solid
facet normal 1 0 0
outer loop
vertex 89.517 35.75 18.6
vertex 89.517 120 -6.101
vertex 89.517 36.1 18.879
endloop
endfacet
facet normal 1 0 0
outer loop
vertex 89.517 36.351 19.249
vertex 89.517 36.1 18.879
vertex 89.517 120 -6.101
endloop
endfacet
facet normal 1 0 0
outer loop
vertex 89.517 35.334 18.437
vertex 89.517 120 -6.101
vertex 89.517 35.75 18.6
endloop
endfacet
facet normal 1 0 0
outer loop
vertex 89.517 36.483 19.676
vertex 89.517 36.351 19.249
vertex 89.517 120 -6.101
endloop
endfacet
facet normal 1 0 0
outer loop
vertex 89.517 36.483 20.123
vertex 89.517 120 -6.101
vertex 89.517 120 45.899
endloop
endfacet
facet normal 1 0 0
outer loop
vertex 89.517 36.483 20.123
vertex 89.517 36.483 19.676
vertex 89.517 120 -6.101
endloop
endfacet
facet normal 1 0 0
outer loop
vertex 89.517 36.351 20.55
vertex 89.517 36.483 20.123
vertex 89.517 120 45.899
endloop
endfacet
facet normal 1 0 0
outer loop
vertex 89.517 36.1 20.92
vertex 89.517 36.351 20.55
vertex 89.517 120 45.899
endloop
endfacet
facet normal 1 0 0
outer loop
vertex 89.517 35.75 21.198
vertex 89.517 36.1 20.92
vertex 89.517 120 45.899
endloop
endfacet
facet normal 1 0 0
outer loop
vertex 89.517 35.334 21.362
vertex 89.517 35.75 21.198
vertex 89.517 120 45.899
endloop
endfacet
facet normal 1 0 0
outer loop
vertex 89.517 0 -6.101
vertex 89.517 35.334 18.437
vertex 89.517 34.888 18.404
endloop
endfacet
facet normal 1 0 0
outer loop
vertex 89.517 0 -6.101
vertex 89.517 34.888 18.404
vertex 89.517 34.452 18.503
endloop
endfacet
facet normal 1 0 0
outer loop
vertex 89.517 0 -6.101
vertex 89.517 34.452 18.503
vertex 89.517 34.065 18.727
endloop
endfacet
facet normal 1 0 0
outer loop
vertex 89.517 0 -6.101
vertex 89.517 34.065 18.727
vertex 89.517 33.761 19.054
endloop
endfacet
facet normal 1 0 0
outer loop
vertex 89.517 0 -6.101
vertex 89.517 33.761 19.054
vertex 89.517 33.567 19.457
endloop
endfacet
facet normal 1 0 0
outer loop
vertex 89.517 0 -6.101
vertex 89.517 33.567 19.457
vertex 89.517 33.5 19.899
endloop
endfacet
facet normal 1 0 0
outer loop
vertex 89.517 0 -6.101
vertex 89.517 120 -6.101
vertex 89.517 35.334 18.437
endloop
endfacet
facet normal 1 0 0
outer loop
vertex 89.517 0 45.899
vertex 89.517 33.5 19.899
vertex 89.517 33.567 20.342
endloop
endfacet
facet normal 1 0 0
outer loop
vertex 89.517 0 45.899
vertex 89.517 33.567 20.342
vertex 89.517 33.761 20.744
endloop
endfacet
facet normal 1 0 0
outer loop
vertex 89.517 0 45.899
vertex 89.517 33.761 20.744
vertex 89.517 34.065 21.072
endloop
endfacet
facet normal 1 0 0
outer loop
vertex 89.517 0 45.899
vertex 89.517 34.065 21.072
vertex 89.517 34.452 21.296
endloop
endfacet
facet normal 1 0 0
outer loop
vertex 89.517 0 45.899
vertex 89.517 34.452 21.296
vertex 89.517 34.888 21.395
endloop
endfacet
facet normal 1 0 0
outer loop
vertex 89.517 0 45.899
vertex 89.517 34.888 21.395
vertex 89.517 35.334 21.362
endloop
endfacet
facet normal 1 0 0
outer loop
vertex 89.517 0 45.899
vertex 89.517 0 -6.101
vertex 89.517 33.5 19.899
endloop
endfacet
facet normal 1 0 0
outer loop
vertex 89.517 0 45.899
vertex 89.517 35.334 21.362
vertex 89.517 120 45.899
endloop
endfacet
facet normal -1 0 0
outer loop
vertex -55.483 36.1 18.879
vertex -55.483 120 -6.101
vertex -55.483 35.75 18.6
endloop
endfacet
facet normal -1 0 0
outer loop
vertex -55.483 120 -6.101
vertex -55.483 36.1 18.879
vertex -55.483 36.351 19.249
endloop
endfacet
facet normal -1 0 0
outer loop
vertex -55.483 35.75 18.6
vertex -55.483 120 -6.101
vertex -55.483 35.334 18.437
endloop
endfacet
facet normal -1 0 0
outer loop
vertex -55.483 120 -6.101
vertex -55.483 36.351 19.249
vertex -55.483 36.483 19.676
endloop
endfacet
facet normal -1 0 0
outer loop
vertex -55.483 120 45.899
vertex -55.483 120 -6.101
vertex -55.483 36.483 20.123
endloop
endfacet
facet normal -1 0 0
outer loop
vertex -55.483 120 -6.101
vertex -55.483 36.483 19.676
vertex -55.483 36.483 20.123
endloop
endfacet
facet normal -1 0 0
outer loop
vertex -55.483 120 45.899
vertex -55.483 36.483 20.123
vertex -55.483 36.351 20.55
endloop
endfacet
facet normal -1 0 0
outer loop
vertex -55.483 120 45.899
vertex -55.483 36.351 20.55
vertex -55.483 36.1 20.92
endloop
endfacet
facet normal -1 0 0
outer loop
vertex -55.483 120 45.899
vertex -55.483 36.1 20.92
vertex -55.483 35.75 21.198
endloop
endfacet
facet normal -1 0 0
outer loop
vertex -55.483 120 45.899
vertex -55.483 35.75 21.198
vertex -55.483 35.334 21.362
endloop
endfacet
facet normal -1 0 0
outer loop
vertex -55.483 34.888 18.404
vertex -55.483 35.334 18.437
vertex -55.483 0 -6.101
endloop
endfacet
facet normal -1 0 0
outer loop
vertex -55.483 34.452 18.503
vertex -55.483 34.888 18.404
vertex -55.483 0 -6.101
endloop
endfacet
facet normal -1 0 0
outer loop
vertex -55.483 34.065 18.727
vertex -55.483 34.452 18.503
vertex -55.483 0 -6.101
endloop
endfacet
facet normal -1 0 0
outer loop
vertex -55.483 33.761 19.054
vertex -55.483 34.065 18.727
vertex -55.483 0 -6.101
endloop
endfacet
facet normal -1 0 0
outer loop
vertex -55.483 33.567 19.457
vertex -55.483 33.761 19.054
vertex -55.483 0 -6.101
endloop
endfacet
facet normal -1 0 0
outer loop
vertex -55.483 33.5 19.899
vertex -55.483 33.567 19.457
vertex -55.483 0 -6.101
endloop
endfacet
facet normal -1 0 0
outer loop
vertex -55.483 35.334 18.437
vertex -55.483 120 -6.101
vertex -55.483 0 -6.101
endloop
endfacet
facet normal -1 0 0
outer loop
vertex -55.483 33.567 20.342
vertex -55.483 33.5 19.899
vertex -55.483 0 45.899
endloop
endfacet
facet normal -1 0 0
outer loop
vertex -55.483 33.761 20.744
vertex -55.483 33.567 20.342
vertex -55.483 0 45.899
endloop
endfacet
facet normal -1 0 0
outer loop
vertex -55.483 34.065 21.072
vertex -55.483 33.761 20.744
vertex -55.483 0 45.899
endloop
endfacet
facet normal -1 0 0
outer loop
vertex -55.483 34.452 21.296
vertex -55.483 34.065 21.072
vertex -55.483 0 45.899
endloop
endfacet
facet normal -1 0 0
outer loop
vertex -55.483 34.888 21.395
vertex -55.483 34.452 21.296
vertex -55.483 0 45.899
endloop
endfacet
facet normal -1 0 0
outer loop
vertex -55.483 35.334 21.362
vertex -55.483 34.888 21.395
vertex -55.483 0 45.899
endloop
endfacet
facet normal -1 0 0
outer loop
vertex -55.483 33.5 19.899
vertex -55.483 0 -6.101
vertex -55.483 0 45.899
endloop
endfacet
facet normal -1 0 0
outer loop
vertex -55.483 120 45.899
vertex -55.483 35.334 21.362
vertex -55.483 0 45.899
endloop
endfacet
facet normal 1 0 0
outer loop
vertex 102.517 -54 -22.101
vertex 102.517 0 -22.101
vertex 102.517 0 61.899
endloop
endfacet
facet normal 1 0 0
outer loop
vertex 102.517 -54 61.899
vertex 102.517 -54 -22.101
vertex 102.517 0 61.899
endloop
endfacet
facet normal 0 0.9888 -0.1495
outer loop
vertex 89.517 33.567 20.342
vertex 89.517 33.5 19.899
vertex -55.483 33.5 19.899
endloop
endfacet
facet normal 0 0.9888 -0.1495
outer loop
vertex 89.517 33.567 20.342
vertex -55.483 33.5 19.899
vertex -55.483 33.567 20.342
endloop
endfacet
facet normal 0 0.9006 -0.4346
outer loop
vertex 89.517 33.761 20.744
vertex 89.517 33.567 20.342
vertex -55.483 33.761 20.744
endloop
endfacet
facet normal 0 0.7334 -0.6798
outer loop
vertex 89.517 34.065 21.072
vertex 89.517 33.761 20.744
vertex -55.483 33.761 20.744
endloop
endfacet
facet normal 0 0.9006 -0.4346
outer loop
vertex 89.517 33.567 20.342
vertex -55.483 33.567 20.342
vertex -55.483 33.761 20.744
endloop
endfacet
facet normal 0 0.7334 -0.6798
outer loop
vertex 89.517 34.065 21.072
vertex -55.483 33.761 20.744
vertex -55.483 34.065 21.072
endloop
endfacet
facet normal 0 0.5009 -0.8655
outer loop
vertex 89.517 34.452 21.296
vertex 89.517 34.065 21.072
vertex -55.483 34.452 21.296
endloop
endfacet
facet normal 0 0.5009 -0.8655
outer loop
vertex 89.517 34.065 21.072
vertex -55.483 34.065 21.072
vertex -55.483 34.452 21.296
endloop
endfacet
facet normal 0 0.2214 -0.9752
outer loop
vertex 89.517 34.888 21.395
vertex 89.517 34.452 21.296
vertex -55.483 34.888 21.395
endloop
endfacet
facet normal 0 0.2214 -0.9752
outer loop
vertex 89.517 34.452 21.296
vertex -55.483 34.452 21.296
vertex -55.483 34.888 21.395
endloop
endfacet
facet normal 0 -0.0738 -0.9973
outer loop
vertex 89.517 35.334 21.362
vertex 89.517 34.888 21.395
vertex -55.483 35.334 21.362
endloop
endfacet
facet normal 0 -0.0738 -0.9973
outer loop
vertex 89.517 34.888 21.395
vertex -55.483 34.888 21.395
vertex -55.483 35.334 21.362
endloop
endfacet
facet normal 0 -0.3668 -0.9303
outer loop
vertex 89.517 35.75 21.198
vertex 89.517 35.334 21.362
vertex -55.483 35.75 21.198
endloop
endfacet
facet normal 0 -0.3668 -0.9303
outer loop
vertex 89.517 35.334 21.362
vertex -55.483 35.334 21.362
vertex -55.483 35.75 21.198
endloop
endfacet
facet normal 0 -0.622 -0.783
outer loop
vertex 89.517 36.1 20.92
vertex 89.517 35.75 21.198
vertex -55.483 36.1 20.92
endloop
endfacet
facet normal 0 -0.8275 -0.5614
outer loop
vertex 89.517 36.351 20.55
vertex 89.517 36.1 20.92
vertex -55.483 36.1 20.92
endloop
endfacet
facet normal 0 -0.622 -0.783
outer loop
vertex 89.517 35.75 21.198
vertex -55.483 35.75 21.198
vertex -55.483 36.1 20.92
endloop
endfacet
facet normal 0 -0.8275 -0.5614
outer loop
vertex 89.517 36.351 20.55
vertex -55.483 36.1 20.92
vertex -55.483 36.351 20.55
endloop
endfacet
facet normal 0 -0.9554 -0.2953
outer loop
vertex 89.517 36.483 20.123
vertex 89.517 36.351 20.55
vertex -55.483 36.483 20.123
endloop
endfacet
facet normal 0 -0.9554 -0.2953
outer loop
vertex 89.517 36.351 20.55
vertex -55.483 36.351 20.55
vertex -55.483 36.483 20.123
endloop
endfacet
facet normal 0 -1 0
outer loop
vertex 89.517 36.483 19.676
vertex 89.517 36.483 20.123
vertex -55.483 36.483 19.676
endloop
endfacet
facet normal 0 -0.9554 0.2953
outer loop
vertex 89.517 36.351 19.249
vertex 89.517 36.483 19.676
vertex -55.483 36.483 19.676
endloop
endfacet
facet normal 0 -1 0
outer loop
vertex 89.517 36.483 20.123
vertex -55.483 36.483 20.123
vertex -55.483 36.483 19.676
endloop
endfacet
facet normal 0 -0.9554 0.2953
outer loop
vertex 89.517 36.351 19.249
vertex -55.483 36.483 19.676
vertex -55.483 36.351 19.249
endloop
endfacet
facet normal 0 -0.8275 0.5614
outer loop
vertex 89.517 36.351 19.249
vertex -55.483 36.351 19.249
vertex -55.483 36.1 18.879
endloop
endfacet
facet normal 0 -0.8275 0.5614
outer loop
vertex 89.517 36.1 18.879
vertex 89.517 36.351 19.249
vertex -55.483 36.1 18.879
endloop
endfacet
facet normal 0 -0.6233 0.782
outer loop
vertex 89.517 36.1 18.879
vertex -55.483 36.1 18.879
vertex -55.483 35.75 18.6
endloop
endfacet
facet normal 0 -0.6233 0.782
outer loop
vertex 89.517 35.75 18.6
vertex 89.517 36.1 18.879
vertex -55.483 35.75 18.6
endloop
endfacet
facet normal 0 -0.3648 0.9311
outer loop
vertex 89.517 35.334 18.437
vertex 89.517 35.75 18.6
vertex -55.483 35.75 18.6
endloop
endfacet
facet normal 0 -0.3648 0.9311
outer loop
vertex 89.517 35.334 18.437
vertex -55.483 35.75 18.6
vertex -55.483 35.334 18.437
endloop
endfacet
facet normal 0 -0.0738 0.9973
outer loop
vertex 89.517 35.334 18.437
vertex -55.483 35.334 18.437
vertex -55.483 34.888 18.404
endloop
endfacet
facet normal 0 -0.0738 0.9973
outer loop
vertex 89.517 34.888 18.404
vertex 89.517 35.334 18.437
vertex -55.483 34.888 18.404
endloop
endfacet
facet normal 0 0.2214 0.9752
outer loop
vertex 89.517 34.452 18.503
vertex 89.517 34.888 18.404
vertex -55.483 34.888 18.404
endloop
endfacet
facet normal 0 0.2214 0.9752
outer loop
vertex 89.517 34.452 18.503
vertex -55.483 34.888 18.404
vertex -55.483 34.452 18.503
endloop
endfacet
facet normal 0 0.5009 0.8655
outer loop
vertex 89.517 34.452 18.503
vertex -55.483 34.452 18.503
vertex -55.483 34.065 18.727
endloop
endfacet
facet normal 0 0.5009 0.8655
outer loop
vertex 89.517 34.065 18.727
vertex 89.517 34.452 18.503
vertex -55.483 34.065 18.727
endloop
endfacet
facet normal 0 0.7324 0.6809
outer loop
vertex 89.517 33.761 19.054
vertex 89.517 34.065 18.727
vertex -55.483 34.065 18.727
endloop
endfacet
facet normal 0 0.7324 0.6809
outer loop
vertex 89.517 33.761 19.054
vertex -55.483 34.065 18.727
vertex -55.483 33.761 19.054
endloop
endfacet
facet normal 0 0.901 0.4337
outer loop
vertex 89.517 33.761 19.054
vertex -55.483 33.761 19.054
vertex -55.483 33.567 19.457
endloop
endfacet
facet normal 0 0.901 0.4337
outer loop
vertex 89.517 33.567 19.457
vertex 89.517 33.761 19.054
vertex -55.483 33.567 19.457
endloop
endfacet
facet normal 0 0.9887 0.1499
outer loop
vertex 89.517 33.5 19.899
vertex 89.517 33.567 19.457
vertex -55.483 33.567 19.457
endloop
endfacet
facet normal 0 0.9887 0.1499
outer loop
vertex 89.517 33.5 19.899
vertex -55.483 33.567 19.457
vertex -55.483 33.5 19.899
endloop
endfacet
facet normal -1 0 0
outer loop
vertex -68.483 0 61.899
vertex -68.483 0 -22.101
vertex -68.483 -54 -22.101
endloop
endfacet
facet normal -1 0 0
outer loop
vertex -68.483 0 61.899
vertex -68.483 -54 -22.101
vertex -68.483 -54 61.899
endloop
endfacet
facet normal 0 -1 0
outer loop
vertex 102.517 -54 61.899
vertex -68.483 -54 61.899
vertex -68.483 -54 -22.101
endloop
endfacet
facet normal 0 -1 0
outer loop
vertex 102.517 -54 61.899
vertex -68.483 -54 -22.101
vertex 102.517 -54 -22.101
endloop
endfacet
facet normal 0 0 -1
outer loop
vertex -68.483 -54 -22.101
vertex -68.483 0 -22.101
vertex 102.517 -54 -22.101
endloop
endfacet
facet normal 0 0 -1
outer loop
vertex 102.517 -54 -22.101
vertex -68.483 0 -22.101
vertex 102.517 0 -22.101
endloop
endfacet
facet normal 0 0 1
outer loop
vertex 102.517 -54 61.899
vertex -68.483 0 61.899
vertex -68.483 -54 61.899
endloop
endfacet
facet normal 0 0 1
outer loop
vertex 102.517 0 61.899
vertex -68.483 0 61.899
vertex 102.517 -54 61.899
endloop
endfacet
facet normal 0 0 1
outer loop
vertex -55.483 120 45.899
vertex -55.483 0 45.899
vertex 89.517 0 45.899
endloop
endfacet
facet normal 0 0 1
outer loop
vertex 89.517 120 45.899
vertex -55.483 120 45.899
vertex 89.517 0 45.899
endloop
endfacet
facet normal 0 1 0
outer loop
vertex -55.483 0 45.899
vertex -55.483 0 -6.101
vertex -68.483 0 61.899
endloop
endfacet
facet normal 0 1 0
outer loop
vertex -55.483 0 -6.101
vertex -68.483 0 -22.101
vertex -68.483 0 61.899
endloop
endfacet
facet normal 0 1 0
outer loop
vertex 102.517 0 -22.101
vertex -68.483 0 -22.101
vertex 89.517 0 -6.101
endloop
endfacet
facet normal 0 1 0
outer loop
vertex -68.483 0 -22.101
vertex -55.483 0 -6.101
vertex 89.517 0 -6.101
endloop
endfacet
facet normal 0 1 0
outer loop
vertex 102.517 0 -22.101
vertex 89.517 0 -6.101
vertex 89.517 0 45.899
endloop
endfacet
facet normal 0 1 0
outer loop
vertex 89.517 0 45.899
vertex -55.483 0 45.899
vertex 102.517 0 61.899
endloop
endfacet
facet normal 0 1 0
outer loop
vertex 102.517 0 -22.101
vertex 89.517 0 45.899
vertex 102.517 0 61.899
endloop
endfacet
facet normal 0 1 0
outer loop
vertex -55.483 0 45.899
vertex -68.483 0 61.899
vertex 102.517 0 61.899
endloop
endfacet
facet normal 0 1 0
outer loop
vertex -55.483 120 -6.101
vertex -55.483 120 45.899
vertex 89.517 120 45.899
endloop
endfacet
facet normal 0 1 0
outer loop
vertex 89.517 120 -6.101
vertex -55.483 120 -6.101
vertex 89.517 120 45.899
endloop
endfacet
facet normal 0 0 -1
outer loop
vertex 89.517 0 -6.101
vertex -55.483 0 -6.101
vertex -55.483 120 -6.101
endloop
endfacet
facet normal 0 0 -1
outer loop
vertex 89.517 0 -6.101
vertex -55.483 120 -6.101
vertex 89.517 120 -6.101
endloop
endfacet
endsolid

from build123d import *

# Parameters (mm, degrees)
F0_W      = 145
F0_H      = 52
F1_DEPTH  = 120
F0_W_2    = 171
F0_H_2    = 84
F1_FACE_W = 145
F1_FACE_H = 52
F2_DEPTH  = 54
F5_D      = 3


with BuildPart() as f1:
    # F0 (on Front) → F1 (new body)
    with BuildSketch(Plane.XZ):
        with Locations((17.016632, 19.899432)):
            Rectangle(F0_W, F0_H)
    extrude(amount=-F1_DEPTH)

    # F0 (on Front) + F1_face (on face) → F2 (join)
    with BuildSketch(Plane.XZ):
        with Locations((17.016632, 19.899432)):
            Rectangle(F0_W_2, F0_H_2)
        with Locations((17.016632, 19.899432)):
            Rectangle(F0_W, F0_H, mode=Mode.SUBTRACT)
    with BuildSketch(Plane(origin=(17.016632, 0, 19.899432), x_dir=(1, 0, 0), z_dir=(0, -1, 0))):
        Rectangle(F1_FACE_W, F1_FACE_H)
    extrude(amount=F2_DEPTH)

    # F5 (through all)
    with Locations(Plane.YZ.offset(90)):
        with Locations((35, 19.899432)):
            Hole(F5_D / 2)


solid = f1.part
